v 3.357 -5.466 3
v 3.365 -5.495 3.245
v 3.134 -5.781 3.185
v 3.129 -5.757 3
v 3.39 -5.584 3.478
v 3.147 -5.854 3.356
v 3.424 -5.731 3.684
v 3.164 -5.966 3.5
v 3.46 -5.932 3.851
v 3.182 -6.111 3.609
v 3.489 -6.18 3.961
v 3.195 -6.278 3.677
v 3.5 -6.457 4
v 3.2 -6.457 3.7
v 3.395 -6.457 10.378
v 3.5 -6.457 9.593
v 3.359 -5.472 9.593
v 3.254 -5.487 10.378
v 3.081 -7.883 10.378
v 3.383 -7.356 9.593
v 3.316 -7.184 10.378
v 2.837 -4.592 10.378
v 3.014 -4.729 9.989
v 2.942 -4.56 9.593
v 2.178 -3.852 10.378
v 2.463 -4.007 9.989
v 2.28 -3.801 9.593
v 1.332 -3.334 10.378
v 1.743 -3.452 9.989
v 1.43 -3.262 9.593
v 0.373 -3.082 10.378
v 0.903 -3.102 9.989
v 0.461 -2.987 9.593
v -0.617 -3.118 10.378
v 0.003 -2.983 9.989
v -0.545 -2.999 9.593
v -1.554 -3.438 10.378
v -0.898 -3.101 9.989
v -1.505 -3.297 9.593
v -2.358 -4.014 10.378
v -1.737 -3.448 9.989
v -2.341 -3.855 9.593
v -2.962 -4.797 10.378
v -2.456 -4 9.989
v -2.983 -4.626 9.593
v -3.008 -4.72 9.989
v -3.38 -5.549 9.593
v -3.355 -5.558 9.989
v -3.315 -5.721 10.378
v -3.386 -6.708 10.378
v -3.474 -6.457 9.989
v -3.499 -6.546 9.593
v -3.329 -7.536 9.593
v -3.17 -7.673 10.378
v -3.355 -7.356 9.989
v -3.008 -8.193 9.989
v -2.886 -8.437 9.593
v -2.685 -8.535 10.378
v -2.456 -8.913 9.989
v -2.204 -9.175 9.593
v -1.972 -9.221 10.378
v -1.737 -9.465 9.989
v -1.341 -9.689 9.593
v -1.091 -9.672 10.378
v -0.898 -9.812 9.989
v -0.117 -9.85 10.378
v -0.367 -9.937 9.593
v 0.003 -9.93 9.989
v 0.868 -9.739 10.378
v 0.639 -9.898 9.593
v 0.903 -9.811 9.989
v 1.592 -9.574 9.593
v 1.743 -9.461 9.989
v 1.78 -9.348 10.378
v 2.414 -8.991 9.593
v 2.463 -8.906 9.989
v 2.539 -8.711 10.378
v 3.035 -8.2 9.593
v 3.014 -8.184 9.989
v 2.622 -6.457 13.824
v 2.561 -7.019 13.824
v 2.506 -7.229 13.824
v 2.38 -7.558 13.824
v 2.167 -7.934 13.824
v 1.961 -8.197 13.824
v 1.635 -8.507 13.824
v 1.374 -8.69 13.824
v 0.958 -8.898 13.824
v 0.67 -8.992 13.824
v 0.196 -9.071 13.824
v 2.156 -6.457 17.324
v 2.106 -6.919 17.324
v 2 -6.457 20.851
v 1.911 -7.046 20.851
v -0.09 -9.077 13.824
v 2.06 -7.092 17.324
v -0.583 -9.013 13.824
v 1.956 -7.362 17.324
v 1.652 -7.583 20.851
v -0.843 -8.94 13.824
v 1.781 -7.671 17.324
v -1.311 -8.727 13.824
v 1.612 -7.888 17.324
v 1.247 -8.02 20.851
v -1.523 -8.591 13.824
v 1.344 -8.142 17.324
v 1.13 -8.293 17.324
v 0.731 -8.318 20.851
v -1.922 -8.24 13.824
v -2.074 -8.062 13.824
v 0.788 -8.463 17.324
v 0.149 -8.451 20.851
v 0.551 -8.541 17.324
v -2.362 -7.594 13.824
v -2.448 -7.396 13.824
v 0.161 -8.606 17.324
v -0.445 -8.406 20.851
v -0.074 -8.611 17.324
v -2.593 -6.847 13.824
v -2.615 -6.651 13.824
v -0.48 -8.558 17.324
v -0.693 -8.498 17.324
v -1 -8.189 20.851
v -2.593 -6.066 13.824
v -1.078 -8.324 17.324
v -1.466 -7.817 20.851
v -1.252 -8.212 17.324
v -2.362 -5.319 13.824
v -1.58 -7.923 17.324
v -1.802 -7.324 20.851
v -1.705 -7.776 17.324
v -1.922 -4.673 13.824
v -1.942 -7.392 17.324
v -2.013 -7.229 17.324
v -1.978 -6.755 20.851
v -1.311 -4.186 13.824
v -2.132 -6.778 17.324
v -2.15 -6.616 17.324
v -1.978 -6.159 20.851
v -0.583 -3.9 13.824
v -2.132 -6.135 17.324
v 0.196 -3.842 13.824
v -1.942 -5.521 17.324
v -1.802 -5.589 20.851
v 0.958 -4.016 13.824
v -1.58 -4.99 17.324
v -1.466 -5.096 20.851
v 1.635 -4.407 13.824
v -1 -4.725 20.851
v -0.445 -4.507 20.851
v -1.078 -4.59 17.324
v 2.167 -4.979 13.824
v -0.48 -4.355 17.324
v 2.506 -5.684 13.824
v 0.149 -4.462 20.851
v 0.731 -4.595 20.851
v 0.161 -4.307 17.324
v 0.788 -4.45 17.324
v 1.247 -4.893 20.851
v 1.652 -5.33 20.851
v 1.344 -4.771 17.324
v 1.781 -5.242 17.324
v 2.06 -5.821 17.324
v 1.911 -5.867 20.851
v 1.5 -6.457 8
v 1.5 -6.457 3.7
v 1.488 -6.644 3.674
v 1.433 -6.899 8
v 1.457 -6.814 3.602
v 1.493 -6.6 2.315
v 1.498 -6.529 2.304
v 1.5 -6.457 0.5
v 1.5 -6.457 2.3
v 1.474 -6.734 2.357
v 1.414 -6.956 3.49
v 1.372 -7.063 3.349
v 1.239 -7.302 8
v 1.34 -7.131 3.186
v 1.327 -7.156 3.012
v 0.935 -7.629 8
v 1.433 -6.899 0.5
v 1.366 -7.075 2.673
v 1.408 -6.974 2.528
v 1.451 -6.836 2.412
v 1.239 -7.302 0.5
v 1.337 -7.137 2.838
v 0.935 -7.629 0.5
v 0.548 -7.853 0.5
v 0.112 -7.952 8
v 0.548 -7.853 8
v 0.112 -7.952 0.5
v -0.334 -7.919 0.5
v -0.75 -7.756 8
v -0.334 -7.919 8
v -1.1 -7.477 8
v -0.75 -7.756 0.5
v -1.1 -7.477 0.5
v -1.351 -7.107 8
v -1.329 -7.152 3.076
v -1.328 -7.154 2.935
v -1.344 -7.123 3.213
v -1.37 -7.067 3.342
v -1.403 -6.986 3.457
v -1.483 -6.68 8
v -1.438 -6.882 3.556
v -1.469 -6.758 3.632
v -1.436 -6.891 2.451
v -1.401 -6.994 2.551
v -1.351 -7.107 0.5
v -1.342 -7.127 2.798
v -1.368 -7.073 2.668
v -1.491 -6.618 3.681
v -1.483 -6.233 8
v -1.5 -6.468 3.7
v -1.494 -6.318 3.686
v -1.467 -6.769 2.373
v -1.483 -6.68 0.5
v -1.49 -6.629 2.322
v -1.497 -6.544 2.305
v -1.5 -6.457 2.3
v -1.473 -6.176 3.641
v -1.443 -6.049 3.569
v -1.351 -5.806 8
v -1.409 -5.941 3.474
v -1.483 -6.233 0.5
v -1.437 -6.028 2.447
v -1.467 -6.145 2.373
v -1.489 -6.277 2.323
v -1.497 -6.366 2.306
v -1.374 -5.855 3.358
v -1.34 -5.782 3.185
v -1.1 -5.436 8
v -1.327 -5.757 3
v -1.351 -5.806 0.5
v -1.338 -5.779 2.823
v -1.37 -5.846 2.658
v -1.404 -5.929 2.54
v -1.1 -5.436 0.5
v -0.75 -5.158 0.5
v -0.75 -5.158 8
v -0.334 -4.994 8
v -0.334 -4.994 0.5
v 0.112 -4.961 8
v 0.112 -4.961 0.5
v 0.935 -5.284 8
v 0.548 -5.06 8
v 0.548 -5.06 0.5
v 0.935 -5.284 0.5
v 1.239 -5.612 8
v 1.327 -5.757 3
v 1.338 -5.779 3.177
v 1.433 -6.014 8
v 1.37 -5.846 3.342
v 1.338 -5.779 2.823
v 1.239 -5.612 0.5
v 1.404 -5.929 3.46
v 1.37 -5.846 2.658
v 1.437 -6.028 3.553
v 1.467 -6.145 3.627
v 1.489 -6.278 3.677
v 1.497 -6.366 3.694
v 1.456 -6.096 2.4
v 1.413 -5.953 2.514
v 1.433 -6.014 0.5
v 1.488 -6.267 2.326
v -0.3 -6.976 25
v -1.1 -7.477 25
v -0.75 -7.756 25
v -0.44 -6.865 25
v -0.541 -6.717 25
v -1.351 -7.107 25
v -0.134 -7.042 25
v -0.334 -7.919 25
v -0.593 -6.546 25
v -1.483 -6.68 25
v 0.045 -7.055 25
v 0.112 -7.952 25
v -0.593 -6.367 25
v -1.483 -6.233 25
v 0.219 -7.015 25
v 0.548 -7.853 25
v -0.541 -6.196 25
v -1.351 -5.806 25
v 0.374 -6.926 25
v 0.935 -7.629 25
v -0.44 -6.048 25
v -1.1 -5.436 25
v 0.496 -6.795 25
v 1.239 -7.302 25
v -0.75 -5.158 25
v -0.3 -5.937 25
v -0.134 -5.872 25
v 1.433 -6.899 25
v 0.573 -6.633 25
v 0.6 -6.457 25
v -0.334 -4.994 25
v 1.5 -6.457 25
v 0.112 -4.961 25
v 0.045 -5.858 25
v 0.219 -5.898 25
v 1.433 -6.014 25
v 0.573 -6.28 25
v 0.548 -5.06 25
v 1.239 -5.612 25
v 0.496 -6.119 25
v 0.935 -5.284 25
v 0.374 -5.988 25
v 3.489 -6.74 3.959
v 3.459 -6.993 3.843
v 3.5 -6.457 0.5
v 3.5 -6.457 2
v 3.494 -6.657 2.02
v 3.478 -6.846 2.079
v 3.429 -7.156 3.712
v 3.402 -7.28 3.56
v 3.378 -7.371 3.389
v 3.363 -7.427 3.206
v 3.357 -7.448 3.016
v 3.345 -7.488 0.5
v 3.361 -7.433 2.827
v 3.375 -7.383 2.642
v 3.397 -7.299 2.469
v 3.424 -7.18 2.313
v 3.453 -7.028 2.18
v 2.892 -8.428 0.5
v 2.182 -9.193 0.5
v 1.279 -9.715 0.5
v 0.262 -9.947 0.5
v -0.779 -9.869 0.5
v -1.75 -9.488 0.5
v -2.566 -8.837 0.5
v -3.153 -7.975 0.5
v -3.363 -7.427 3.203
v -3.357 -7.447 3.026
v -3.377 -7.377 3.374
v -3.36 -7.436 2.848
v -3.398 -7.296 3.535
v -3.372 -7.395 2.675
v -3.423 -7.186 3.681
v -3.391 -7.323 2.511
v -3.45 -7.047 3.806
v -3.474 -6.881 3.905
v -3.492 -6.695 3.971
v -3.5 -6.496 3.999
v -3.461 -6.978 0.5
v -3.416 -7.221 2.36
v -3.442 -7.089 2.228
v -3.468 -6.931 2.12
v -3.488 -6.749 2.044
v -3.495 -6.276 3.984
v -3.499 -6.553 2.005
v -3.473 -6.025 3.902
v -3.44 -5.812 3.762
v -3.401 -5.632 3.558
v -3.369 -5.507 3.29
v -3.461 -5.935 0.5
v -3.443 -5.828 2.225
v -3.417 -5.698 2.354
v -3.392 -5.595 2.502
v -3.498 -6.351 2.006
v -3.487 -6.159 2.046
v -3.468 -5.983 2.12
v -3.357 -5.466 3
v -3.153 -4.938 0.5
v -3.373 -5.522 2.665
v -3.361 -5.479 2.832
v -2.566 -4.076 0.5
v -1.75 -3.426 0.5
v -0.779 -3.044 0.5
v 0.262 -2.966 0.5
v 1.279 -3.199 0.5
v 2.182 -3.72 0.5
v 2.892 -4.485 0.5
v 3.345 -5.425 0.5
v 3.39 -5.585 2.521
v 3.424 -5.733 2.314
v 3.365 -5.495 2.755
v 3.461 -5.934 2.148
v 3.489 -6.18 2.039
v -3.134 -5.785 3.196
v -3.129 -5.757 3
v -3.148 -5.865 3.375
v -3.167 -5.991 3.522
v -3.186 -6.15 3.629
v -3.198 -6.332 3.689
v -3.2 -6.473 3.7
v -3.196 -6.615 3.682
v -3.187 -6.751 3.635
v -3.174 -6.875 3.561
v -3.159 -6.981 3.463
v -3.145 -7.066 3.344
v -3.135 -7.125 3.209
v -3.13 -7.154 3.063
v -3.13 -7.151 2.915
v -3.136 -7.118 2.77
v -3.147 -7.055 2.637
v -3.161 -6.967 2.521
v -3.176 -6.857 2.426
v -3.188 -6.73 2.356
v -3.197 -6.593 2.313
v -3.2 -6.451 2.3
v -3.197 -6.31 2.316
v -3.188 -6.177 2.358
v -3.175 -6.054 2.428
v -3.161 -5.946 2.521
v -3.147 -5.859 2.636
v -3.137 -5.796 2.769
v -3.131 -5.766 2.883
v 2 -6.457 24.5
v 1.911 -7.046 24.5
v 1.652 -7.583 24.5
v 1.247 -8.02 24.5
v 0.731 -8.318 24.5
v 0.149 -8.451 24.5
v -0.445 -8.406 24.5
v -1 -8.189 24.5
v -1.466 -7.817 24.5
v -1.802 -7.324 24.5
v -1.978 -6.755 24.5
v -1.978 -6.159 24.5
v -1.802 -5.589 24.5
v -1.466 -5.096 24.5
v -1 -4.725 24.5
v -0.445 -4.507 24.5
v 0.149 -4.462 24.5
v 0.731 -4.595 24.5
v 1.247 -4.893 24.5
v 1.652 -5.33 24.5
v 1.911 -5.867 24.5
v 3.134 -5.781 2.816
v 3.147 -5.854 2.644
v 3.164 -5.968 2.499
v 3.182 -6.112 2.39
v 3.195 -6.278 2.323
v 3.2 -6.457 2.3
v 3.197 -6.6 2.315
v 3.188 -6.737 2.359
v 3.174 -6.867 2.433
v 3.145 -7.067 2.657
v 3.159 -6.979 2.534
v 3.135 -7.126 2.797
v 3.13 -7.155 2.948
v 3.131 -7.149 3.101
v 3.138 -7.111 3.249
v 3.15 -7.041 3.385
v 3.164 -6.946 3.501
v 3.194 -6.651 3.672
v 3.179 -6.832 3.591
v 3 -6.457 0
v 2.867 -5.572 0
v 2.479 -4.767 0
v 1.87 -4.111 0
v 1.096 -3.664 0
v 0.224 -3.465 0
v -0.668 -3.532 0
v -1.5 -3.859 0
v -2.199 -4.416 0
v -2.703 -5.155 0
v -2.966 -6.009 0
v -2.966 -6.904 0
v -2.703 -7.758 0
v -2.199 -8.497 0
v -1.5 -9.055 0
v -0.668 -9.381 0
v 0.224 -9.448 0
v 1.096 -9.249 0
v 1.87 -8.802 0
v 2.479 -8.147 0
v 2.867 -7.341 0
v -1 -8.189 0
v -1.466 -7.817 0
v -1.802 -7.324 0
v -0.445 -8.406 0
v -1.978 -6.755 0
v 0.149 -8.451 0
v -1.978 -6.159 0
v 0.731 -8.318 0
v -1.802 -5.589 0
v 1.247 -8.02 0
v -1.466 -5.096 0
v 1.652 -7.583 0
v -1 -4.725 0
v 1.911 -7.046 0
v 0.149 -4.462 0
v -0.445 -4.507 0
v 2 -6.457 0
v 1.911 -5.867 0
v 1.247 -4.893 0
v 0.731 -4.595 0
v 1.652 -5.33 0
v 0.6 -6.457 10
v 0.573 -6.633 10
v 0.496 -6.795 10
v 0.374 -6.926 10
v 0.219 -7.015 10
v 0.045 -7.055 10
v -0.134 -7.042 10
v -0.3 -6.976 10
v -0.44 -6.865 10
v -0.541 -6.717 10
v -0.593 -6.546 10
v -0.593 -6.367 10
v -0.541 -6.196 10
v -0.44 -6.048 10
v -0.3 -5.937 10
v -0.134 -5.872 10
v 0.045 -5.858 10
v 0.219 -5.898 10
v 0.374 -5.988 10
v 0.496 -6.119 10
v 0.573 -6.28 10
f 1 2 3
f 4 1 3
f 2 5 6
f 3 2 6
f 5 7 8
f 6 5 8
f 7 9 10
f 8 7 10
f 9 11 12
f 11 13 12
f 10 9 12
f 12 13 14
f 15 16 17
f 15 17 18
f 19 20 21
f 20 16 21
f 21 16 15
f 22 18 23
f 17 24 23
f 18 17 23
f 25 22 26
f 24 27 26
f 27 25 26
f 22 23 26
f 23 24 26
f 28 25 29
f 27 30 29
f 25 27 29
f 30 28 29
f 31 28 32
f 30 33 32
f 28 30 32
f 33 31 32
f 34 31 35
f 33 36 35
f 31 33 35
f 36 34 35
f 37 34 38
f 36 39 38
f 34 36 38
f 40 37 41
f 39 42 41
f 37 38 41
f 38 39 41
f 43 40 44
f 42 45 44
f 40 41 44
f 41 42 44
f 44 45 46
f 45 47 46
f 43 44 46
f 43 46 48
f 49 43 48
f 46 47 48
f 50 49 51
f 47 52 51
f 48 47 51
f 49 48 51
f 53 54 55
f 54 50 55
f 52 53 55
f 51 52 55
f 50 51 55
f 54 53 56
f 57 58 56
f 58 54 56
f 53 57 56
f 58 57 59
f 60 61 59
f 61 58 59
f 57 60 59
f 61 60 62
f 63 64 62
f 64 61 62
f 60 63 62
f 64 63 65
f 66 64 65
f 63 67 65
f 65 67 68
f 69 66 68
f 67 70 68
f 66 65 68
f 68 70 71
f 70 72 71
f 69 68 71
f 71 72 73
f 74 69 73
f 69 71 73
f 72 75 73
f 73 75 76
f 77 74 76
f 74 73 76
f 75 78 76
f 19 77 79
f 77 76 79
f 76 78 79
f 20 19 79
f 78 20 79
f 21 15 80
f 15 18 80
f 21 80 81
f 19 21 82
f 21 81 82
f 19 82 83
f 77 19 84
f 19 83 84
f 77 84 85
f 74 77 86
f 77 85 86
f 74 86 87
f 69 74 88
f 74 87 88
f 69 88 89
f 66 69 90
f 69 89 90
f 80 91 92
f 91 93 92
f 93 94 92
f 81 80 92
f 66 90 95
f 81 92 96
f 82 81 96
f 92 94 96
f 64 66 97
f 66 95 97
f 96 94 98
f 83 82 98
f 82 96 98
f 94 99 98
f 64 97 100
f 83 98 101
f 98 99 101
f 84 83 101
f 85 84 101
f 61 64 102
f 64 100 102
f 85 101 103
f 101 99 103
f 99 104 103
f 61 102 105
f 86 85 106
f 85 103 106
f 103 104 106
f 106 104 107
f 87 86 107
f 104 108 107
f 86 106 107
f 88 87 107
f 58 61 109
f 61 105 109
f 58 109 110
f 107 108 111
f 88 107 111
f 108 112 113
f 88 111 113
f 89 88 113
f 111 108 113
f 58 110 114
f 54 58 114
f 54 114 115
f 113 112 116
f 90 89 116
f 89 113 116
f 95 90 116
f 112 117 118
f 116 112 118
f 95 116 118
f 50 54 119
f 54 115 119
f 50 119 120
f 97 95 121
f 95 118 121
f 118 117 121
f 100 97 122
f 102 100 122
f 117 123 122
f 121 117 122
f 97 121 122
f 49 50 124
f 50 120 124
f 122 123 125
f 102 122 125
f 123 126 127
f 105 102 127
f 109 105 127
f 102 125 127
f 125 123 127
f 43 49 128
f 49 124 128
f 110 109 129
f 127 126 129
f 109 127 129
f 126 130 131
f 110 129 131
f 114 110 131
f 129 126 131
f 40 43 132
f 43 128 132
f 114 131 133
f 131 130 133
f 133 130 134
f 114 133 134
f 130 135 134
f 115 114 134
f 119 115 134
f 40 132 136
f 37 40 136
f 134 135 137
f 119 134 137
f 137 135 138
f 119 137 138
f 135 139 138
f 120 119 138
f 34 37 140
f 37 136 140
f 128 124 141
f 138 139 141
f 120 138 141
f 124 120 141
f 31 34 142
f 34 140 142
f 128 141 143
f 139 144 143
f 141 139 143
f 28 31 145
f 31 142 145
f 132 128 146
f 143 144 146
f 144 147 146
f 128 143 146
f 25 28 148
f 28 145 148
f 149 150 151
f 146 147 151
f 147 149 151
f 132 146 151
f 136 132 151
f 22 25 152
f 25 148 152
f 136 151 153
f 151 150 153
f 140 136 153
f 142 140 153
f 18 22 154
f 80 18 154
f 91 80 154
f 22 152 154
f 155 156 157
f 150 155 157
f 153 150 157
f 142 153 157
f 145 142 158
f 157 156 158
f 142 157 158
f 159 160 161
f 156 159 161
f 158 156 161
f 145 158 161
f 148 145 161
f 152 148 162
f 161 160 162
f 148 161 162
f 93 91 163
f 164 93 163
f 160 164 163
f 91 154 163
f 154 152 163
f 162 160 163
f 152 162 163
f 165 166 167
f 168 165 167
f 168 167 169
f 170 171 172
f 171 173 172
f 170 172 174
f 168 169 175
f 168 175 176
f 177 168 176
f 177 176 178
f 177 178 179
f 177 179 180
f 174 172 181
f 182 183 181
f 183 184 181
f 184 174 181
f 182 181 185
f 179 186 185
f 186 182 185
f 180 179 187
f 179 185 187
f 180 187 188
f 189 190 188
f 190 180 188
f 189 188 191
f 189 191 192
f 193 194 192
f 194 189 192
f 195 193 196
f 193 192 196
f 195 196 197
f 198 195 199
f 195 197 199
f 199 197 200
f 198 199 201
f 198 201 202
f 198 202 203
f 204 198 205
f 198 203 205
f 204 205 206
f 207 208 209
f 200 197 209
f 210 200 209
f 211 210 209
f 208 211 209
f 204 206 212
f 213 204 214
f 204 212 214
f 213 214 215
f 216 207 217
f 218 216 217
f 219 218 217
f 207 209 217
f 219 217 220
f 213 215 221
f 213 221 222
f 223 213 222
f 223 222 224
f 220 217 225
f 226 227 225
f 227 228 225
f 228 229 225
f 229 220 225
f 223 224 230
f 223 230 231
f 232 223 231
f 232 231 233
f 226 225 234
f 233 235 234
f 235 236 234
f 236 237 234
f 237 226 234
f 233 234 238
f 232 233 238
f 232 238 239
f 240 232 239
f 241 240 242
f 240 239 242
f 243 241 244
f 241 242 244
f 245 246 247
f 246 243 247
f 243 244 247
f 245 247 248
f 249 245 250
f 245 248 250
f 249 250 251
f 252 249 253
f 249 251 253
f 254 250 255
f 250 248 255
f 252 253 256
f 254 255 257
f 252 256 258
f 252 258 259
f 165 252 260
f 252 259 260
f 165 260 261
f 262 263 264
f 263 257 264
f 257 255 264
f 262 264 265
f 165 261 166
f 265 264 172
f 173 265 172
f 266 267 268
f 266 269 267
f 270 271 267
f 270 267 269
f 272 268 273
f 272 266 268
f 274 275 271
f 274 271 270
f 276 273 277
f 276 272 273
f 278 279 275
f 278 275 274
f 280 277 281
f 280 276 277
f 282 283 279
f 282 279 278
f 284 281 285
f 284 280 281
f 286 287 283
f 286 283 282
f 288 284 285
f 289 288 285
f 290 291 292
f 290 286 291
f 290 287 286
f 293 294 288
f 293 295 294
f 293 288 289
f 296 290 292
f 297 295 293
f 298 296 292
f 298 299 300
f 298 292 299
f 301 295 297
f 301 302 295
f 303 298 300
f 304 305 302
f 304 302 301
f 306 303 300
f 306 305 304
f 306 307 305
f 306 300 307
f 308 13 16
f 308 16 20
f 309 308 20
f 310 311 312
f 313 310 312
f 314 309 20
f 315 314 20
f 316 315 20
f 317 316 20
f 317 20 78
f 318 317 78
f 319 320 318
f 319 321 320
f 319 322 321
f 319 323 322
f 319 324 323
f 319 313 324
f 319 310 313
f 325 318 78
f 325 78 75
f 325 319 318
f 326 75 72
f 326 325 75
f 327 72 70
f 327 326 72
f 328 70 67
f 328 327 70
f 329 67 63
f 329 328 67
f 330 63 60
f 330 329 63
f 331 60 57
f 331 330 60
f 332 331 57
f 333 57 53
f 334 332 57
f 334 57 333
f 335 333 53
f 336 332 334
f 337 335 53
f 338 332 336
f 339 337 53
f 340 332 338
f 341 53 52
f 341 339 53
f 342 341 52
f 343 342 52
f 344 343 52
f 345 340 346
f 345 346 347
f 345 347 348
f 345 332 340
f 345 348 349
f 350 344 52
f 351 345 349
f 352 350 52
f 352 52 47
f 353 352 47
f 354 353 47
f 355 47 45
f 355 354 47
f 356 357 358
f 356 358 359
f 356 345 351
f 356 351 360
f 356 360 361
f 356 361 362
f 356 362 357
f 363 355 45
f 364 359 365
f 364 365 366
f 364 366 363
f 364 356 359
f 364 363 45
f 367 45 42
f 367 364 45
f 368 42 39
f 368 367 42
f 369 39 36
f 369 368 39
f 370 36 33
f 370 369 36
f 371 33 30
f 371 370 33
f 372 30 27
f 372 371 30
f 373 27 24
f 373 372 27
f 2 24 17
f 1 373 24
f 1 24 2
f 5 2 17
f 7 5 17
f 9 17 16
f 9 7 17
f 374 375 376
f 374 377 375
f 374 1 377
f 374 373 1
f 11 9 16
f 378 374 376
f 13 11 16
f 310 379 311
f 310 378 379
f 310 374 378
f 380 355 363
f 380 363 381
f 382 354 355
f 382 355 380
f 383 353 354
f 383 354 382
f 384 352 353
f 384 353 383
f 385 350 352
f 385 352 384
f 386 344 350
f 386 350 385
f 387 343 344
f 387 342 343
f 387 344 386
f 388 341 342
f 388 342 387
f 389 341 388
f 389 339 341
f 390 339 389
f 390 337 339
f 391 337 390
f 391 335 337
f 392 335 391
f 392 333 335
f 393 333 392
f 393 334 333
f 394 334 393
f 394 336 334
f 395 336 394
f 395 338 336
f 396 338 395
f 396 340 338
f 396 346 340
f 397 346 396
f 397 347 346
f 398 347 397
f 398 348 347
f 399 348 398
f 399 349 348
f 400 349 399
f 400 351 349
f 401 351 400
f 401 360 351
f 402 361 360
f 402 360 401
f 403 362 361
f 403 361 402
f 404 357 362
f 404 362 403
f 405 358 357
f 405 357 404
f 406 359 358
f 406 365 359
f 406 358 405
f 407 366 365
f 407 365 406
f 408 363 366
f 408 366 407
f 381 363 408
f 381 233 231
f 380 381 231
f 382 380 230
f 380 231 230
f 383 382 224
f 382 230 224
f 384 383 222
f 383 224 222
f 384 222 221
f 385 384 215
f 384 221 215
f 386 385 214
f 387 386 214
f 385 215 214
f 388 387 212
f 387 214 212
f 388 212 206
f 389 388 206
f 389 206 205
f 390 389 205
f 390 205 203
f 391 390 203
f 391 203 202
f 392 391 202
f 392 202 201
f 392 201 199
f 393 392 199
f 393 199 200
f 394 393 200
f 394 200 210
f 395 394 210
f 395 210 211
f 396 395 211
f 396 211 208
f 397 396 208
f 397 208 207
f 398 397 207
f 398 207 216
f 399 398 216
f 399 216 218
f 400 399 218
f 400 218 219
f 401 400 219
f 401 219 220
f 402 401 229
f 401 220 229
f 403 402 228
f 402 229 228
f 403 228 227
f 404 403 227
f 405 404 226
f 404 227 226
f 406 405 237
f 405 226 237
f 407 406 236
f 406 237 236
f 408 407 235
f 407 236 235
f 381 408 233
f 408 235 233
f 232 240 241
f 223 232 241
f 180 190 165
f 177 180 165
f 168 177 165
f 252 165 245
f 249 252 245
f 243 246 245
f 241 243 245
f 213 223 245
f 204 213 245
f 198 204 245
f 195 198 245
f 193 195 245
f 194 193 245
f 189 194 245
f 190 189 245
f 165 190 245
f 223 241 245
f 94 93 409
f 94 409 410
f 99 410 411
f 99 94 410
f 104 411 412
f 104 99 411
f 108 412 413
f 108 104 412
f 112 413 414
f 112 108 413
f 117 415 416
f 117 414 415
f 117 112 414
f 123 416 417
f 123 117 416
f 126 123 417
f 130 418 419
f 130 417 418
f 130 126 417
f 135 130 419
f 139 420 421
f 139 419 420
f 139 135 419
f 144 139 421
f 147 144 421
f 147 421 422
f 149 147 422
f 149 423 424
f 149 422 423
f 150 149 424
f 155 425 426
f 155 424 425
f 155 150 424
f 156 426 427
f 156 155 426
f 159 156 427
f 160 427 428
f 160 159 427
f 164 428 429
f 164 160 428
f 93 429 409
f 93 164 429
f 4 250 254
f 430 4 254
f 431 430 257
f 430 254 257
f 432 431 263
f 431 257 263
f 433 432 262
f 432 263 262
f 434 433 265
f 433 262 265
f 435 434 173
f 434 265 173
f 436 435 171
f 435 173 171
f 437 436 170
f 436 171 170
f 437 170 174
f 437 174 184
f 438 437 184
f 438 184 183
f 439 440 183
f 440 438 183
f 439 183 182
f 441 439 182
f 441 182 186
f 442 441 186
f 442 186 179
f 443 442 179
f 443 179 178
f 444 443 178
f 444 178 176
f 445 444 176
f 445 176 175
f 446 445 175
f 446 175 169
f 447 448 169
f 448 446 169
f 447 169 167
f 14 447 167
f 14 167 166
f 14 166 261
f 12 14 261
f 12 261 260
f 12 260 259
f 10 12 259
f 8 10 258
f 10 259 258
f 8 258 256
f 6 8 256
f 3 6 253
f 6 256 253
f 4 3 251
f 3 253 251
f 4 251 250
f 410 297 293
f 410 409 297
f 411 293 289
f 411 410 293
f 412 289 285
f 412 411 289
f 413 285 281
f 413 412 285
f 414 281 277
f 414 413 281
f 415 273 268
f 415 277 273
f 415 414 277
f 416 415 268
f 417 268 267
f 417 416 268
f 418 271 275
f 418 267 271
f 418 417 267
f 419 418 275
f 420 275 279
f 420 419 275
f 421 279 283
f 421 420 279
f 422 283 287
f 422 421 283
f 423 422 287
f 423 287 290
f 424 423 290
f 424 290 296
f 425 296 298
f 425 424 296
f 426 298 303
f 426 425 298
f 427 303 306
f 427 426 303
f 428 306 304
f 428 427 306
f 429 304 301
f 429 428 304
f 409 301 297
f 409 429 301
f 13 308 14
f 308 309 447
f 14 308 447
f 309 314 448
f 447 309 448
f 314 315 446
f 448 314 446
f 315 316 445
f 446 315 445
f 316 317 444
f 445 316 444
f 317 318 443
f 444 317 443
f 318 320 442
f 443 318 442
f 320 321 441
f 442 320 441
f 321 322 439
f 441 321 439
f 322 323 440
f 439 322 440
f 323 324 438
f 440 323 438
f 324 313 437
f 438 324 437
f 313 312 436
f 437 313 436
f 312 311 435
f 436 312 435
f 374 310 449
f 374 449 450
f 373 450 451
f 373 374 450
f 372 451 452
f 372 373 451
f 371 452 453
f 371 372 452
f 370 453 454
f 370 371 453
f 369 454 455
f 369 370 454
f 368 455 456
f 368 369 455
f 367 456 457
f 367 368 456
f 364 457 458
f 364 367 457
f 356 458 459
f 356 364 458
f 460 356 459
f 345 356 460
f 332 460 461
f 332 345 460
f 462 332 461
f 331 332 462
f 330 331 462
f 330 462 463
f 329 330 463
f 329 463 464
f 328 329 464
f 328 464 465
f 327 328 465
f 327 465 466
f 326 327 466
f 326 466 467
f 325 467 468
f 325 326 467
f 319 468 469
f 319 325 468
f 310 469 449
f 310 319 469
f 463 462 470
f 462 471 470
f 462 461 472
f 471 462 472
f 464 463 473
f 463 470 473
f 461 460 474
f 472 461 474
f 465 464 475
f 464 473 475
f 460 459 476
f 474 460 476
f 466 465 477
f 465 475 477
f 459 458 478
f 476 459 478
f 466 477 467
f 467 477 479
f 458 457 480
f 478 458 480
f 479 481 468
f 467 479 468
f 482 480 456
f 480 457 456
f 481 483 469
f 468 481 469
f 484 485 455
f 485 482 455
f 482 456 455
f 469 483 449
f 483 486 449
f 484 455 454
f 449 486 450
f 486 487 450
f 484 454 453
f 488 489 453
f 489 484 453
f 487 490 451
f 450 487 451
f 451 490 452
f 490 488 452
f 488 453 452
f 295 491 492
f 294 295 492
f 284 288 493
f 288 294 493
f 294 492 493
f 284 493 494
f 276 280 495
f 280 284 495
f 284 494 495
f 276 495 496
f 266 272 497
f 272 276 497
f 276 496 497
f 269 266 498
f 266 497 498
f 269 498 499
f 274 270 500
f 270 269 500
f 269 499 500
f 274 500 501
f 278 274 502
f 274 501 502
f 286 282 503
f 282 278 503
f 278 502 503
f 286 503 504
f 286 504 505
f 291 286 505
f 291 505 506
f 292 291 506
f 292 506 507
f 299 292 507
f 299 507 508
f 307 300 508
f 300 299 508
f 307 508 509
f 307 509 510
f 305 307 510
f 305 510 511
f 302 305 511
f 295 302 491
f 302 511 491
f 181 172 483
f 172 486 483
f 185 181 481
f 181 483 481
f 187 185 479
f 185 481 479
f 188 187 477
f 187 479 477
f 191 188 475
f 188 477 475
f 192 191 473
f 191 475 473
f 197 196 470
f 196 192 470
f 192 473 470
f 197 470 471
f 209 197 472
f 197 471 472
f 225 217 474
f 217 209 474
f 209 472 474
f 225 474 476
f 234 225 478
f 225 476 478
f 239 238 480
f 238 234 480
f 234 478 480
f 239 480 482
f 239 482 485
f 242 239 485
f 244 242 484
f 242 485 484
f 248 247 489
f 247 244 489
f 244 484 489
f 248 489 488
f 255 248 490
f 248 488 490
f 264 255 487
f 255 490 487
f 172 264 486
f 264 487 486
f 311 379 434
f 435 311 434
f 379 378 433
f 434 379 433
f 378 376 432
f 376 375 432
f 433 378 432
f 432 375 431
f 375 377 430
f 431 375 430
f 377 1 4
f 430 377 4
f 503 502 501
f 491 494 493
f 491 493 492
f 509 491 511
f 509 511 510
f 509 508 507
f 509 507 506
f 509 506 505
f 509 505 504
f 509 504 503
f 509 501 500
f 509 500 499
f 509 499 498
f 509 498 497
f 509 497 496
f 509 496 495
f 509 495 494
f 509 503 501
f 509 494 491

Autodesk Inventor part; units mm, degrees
ref_plane "YZ Plane" through (0, 0, 0) normal (1, 0, 0) x (0, 1, 0)
ref_plane "XZ Plane" through (0, 0, 0) normal (0, 1, 0) x (-1, 0, 0)
ref_plane "XY Plane" through (0, 0, 0) normal (0, 0, 1) x (1, 0, 0)
sketch "Sketch1" plane through (0, 0, 0) normal (0, 0, 1) x (1, 0, 0)
  circle A0 centre (0, -6.4566) radius 1.5 projected
  circle A1 centre (0, -6.4566) radius 1.5
  circle A2 centre (0, -6.4566) radius 3.5
  point P0 (0, 0)
  dimension "d0" = 3
  dimension "d1" = 7
extrude "Extrusion1" add sketch "Sketch1" along normal blind 8
sketch "Sketch2" plane through (0, -6.4566, 8) normal (0, 0, 1) x (1, 0, 0)
  circle A0 centre (0, 0) radius 3.5 projected
  point P0 (0, 6.4566)
extrude "Extrusion2" add sketch "Sketch2" along normal blind 2
sketch "Sketch3" plane through (0, -6.4566, 10) normal (0, 0, 1) x (1, 0, 0)
  circle A0 centre (0, 0) radius 3.5 projected
  circle A1 centre (0, 0) radius 0.6
  circle A2 centre (0, 0) radius 2
  point P0 (0, 6.4566)
  dimension "d6" = 1.2
  dimension "d7" = 4
extrude "Extrusion3" add sketch "Sketch3" along normal blind 15 contours A2
fillet "Fillet1" radius 40 1 edges at (-2, -6.4566, 10)
fillet "Fillet2" radius 3 1 edges at (-3.5, -6.4566, 10)
chamfer "Chamfer1" distance 0.5 angle 45 1 edges at (-1.5, -6.4566, 0)
chamfer "Chamfer2" distance 0.5 angle 45 1 edges at (-2, -6.4566, 25)
sketch "Sketch4" plane through (0, 0, 0) normal (1, 0, 0) x (0, 1, 0)
  line L0 (-2.9566, 0) -> (-9.9566, 0) projected
  line L1 (-6.4566, 0) -> (-6.4566, 3)
  circle A0 centre (-6.4566, 3) radius 0.7
  point P0 (0, 0)
  dimension "d18" = 3
  dimension "d19" = 1.4
extrude "Extrusion4" cut sketch "Sketch4" along normal mid plane 15
chamfer "Chamfer3" distance 0.3 angle 45 4 edges at (3.4625, -5.9454, 3.4781) (3.4627, -5.9468, 2.5204) (3.4293, -7.1566, 2.9993) (-3.4293, -7.1565, 2.9852)
chamfer "Chamfer4" distance 0.5 angle 45 1 edges at (-3.5, -6.4566, 0)
properties part number "needle_conn_1"
